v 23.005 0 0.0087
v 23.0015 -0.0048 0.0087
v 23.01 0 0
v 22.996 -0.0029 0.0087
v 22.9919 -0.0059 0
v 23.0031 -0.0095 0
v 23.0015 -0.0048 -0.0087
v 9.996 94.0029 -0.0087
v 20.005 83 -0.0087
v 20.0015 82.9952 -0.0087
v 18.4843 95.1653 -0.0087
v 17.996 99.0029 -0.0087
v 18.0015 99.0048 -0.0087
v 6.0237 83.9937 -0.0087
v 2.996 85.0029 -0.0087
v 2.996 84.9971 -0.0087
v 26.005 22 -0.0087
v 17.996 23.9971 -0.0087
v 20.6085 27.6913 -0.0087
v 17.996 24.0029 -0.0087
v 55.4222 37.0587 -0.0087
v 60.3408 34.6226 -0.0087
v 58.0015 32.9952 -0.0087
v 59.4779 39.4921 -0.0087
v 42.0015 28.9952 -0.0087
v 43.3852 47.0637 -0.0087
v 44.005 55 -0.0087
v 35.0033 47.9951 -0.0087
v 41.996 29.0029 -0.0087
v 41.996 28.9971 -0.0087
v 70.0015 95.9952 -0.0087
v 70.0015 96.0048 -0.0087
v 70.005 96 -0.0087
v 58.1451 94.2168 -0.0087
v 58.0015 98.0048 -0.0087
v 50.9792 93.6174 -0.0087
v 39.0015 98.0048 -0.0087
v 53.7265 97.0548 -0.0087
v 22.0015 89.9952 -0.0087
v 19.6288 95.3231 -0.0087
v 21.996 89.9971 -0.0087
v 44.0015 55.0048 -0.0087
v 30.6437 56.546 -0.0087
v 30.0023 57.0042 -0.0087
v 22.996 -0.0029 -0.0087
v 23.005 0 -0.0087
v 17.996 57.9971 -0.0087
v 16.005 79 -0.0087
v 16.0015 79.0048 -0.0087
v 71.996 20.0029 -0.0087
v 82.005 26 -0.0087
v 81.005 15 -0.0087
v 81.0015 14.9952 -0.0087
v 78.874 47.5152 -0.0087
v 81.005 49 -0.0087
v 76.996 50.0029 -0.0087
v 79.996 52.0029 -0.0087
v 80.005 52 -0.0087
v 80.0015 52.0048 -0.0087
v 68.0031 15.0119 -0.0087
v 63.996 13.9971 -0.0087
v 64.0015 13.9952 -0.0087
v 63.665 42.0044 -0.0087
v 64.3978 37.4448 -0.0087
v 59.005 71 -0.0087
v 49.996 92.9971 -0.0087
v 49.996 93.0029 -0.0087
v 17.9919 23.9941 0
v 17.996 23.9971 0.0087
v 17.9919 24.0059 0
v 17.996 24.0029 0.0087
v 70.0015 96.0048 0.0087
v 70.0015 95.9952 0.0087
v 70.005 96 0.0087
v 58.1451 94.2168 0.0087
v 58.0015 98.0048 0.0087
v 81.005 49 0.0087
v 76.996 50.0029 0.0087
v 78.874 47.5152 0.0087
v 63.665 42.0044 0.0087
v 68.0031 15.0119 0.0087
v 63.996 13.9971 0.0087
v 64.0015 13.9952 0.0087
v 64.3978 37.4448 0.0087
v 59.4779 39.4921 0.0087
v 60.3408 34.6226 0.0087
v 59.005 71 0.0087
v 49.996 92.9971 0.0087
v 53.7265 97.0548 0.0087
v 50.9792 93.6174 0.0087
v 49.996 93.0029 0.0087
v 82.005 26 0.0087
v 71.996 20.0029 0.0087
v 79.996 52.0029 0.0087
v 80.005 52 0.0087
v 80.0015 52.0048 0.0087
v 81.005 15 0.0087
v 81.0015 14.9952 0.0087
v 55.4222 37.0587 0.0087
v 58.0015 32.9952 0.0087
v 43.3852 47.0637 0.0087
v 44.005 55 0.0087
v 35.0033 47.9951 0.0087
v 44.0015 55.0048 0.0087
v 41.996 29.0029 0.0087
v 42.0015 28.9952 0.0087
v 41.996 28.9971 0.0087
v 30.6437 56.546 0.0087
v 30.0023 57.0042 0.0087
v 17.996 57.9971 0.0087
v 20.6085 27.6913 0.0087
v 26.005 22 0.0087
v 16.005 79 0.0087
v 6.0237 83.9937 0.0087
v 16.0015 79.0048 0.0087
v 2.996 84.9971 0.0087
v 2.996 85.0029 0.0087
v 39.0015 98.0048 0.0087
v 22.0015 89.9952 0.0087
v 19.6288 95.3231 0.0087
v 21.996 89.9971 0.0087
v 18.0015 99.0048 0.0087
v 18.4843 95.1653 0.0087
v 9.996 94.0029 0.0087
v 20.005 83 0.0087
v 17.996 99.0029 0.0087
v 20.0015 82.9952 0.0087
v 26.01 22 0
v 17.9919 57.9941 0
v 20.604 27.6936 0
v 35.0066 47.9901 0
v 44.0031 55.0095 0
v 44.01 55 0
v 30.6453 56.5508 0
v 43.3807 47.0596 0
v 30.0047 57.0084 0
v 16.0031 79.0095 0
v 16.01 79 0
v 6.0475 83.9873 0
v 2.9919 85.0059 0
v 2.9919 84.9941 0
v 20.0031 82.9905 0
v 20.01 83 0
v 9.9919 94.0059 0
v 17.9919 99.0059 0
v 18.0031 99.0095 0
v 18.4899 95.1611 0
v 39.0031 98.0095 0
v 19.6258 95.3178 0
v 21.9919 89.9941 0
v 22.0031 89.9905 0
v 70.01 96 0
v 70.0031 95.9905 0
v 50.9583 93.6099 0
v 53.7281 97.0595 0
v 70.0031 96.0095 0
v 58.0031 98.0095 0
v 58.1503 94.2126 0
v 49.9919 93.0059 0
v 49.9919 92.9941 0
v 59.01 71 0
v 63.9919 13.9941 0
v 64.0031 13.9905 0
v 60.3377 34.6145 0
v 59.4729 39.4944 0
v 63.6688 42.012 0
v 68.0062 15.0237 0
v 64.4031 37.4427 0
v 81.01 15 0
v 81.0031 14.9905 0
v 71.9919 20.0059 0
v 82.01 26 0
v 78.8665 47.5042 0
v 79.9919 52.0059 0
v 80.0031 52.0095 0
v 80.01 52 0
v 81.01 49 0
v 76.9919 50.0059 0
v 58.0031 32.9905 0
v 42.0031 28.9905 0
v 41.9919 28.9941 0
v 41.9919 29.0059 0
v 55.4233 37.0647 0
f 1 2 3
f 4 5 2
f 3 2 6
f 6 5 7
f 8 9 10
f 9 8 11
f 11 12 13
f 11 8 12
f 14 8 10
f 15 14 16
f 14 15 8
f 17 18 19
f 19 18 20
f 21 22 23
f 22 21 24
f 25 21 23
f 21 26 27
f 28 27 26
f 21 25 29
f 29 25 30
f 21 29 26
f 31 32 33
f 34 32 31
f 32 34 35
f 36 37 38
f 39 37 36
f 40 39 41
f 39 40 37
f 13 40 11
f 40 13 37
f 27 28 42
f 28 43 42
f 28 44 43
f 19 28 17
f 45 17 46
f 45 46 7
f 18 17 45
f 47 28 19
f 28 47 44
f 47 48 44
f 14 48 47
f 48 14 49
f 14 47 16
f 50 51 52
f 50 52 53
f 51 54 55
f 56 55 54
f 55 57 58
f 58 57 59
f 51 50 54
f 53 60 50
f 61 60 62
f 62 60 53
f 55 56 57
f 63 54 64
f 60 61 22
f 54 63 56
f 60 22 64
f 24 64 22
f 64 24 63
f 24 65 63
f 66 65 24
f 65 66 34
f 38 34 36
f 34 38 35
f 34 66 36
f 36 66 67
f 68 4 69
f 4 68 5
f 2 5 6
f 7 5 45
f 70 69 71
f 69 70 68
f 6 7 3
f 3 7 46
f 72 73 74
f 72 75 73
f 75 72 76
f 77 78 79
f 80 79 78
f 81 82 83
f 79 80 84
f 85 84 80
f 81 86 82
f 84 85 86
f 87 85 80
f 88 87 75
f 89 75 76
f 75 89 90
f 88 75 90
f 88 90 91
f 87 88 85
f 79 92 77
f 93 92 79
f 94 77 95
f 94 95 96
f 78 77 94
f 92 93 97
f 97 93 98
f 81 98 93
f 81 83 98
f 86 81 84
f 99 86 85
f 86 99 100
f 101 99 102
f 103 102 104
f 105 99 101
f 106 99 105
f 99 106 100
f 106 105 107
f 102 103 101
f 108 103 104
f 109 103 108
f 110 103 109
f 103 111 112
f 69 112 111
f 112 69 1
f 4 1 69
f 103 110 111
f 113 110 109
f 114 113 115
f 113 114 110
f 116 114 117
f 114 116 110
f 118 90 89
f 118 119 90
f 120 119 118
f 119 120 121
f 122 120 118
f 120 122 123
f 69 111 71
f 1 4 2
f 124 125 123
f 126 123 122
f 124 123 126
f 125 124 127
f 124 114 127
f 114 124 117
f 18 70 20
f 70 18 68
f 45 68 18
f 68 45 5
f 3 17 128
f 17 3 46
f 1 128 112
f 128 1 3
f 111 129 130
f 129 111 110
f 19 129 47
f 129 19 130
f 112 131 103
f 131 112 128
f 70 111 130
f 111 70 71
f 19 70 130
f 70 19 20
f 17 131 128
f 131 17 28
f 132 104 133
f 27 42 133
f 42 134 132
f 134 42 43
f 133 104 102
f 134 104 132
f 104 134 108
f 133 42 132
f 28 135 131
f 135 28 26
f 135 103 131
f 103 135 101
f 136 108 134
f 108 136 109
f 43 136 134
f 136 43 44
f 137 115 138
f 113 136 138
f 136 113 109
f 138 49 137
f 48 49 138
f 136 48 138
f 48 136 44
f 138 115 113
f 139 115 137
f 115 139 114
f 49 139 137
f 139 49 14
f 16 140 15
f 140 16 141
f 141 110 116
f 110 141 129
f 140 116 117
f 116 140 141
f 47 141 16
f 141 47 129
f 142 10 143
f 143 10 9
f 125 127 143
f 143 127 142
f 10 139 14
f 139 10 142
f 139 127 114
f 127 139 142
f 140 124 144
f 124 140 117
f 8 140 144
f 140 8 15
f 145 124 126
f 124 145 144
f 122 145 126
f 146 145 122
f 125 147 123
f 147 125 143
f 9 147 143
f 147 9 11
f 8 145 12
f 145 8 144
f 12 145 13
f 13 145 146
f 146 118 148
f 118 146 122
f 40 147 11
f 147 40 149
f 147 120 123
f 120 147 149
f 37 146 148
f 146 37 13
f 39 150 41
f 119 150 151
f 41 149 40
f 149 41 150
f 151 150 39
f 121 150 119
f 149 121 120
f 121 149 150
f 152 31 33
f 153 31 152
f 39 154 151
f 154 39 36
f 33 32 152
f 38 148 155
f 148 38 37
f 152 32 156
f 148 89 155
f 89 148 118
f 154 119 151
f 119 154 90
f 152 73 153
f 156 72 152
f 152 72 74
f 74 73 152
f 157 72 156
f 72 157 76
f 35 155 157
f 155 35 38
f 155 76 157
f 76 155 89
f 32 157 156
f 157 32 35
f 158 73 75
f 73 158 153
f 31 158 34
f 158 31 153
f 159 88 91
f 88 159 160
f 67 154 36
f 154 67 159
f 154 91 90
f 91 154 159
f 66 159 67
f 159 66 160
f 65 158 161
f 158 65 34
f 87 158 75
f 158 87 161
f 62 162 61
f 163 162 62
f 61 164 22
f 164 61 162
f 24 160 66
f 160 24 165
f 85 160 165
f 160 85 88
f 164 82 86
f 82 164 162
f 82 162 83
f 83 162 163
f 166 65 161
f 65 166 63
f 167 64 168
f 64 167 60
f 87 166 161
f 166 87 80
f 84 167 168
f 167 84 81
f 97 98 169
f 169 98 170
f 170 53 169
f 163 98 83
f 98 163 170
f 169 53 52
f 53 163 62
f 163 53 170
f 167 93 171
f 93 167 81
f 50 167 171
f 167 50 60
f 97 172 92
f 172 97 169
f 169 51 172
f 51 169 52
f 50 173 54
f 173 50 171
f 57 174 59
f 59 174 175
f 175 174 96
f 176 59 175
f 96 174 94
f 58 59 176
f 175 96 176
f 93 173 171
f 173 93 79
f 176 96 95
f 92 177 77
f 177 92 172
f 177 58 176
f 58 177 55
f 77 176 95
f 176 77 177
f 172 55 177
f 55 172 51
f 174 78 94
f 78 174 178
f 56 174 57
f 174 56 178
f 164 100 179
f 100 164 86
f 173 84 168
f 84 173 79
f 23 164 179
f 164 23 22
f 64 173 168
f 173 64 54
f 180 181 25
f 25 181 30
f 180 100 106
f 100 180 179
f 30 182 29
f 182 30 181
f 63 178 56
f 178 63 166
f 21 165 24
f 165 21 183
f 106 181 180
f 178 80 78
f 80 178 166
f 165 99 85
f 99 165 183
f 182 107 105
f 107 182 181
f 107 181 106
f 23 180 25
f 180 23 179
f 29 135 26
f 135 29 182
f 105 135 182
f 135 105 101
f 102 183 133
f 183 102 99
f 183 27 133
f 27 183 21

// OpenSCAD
color([0.9585806736472646,0.593334846568766,0.09927504601217696]) hull(){
    translate([23,0]) sphere(0.01);
    translate([18,24]) sphere(0.01);
    translate([24,21]) sphere(0.01);
}
color([0.19313665173925,0.6863688301261038,0.2093263356404984]) hull(){
    translate([23,0]) sphere(0.01);
    translate([26,22]) sphere(0.01);
    translate([18,24]) sphere(0.01);
}
color([0.2694340379225941,0.24598969558588324,0.16092298384524362]) hull(){
    translate([23,0]) sphere(0.01);
    translate([18,58]) sphere(0.01);
    translate([26,22]) sphere(0.01);
}
color([0.5102606956149307,0.431705445139412,0.38909399282504675]) hull(){
    translate([18,24]) sphere(0.01);
    translate([26,22]) sphere(0.01);
    translate([35,48]) sphere(0.01);
}
color([0.3194819673674283,0.6655357355223767,0.22692357675811492]) hull(){
    translate([26,22]) sphere(0.01);
    translate([18,58]) sphere(0.01);
    translate([35,48]) sphere(0.01);
}
color([0.9464906820257937,0.35776616524050997,0.9421064453260054]) hull(){
    translate([18,58]) sphere(0.01);
    translate([35,48]) sphere(0.01);
    translate([44,55]) sphere(0.01);
}
color([0.3792404853118415,0.27508202782836655,0.9368074710650367]) hull(){
    translate([44,55]) sphere(0.01);
    translate([35,48]) sphere(0.01);
    translate([44,47]) sphere(0.01);
}
color([0.7670397757471089,0.17483880300164423,0.7474114244696689]) hull(){
    translate([44,47]) sphere(0.01);
    translate([35,48]) sphere(0.01);
    translate([30,57]) sphere(0.01);
}
color([0.6015236368594579,0.5872808850844162,0.28390336255679416]) hull(){
    translate([35,48]) sphere(0.01);
    translate([30,57]) sphere(0.01);
    translate([26,51]) sphere(0.01);
}
color([0.5839405385485582,0.4048698908705002,0.6877557316706271]) hull(){
    translate([30,57]) sphere(0.01);
    translate([26,51]) sphere(0.01);
    translate([16,79]) sphere(0.01);
}
color([0.29310936231965135,0.08456113000314536,0.6409271470126323]) hull(){
    translate([26,51]) sphere(0.01);
    translate([16,79]) sphere(0.01);
    translate([18,58]) sphere(0.01);
}
color([0.38512246522478266,0.6162859510128613,0.407224705538046]) hull(){
    translate([16,79]) sphere(0.01);
    translate([18,58]) sphere(0.01);
    translate([6,84]) sphere(0.01);
}
color([0.6107800780239486,0.9541913078580654,0.09369719926319908]) hull(){
    translate([18,58]) sphere(0.01);
    translate([6,84]) sphere(0.01);
    translate([3,85]) sphere(0.01);
}
color([0.4396226851829427,0.9817497074141792,0.30111933510979894]) hull(){
    translate([6,84]) sphere(0.01);
    translate([3,85]) sphere(0.01);
    translate([20,83]) sphere(0.01);
}
color([0.08571041628526821,0.691130580335744,0.16573157374072334]) hull(){
    translate([3,85]) sphere(0.01);
    translate([20,83]) sphere(0.01);
    translate([10,94]) sphere(0.01);
}
color([0.4668304924867862,0.30100213617539295,0.3511677492745029]) hull(){
    translate([20,83]) sphere(0.01);
    translate([10,94]) sphere(0.01);
    translate([18,99]) sphere(0.01);
}
color([0.05564944269037686,0.7696481469448815,0.686275624239137]) hull(){
    translate([10,94]) sphere(0.01);
    translate([18,99]) sphere(0.01);
    translate([39,98]) sphere(0.01);
}
color([0.15447252119296884,0.35335085758162643,0.18799175914388588]) hull(){
    translate([18,99]) sphere(0.01);
    translate([39,98]) sphere(0.01);
    translate([22,90]) sphere(0.01);
}
color([0.41322879780265653,0.82270842281296,0.9057146612667819]) hull(){
    translate([39,98]) sphere(0.01);
    translate([22,90]) sphere(0.01);
    translate([70,96]) sphere(0.01);
}
color([0.9688547633127277,0.5528378273263655,0.12760284187612392]) hull(){
    translate([22,90]) sphere(0.01);
    translate([70,96]) sphere(0.01);
    translate([58,98]) sphere(0.01);
}
color([0.1710979555253146,0.7131998843266452,0.6397779425125977]) hull(){
    translate([70,96]) sphere(0.01);
    translate([58,98]) sphere(0.01);
    translate([50,93]) sphere(0.01);
}
color([0.57496968906483,0.8489371230716904,0.07944838941339594]) hull(){
    translate([58,98]) sphere(0.01);
    translate([50,93]) sphere(0.01);
    translate([59,71]) sphere(0.01);
}
color([0.040333123224873146,0.9305910632054132,0.3080440975445232]) hull(){
    translate([50,93]) sphere(0.01);
    translate([59,71]) sphere(0.01);
    translate([64,14]) sphere(0.01);
}
color([0.6084655882345898,0.4923441190446234,0.7069385087242315]) hull(){
    translate([59,71]) sphere(0.01);
    translate([64,14]) sphere(0.01);
    translate([68,15]) sphere(0.01);
}
color([0.6803385961846494,0.18024793645131376,0.10787678186317007]) hull(){
    translate([64,14]) sphere(0.01);
    translate([68,15]) sphere(0.01);
    translate([81,15]) sphere(0.01);
}
color([0.1335624130282893,0.47731112778056706,0.8393950916733898]) hull(){
    translate([68,15]) sphere(0.01);
    translate([81,15]) sphere(0.01);
    translate([72,20]) sphere(0.01);
}
color([0.6780893207968227,0.08337096158279222,0.27725115680544954]) hull(){
    translate([81,15]) sphere(0.01);
    translate([72,20]) sphere(0.01);
    translate([82,26]) sphere(0.01);
}
color([0.9965791662073833,0.03375154870506614,0.10494976972159242]) hull(){
    translate([72,20]) sphere(0.01);
    translate([82,26]) sphere(0.01);
    translate([80,52]) sphere(0.01);
}
color([0.516844917539197,0.1360610465034362,0.543805910213663]) hull(){
    translate([82,26]) sphere(0.01);
    translate([80,52]) sphere(0.01);
    translate([81,49]) sphere(0.01);
}
color([0.04901628196141694,0.4867102513994055,0.8813892002857401]) hull(){
    translate([80,52]) sphere(0.01);
    translate([81,49]) sphere(0.01);
    translate([77,50]) sphere(0.01);
}
color([0.3053751014353143,0.40772022041766365,0.31297204198076634]) hull(){
    translate([81,49]) sphere(0.01);
    translate([77,50]) sphere(0.01);
    translate([58,33]) sphere(0.01);
}
color([0.49907796034366436,0.6160709555012981,0.9916538905911245]) hull(){
    translate([77,50]) sphere(0.01);
    translate([58,33]) sphere(0.01);
    translate([42,29]) sphere(0.01);
}
color([0.3123575451593331,0.46364206475662195,0.8862899719975306]) hull(){
    translate([58,33]) sphere(0.01);
    translate([42,29]) sphere(0.01);
    translate([44,55]) sphere(0.01);
}
color([0.5738800220993816,0.8494037217359881,0.24323676398212035]) hull(){
    translate([42,29]) sphere(0.01);
    translate([44,55]) sphere(0.01);
    translate([44,47]) sphere(0.01);
}
